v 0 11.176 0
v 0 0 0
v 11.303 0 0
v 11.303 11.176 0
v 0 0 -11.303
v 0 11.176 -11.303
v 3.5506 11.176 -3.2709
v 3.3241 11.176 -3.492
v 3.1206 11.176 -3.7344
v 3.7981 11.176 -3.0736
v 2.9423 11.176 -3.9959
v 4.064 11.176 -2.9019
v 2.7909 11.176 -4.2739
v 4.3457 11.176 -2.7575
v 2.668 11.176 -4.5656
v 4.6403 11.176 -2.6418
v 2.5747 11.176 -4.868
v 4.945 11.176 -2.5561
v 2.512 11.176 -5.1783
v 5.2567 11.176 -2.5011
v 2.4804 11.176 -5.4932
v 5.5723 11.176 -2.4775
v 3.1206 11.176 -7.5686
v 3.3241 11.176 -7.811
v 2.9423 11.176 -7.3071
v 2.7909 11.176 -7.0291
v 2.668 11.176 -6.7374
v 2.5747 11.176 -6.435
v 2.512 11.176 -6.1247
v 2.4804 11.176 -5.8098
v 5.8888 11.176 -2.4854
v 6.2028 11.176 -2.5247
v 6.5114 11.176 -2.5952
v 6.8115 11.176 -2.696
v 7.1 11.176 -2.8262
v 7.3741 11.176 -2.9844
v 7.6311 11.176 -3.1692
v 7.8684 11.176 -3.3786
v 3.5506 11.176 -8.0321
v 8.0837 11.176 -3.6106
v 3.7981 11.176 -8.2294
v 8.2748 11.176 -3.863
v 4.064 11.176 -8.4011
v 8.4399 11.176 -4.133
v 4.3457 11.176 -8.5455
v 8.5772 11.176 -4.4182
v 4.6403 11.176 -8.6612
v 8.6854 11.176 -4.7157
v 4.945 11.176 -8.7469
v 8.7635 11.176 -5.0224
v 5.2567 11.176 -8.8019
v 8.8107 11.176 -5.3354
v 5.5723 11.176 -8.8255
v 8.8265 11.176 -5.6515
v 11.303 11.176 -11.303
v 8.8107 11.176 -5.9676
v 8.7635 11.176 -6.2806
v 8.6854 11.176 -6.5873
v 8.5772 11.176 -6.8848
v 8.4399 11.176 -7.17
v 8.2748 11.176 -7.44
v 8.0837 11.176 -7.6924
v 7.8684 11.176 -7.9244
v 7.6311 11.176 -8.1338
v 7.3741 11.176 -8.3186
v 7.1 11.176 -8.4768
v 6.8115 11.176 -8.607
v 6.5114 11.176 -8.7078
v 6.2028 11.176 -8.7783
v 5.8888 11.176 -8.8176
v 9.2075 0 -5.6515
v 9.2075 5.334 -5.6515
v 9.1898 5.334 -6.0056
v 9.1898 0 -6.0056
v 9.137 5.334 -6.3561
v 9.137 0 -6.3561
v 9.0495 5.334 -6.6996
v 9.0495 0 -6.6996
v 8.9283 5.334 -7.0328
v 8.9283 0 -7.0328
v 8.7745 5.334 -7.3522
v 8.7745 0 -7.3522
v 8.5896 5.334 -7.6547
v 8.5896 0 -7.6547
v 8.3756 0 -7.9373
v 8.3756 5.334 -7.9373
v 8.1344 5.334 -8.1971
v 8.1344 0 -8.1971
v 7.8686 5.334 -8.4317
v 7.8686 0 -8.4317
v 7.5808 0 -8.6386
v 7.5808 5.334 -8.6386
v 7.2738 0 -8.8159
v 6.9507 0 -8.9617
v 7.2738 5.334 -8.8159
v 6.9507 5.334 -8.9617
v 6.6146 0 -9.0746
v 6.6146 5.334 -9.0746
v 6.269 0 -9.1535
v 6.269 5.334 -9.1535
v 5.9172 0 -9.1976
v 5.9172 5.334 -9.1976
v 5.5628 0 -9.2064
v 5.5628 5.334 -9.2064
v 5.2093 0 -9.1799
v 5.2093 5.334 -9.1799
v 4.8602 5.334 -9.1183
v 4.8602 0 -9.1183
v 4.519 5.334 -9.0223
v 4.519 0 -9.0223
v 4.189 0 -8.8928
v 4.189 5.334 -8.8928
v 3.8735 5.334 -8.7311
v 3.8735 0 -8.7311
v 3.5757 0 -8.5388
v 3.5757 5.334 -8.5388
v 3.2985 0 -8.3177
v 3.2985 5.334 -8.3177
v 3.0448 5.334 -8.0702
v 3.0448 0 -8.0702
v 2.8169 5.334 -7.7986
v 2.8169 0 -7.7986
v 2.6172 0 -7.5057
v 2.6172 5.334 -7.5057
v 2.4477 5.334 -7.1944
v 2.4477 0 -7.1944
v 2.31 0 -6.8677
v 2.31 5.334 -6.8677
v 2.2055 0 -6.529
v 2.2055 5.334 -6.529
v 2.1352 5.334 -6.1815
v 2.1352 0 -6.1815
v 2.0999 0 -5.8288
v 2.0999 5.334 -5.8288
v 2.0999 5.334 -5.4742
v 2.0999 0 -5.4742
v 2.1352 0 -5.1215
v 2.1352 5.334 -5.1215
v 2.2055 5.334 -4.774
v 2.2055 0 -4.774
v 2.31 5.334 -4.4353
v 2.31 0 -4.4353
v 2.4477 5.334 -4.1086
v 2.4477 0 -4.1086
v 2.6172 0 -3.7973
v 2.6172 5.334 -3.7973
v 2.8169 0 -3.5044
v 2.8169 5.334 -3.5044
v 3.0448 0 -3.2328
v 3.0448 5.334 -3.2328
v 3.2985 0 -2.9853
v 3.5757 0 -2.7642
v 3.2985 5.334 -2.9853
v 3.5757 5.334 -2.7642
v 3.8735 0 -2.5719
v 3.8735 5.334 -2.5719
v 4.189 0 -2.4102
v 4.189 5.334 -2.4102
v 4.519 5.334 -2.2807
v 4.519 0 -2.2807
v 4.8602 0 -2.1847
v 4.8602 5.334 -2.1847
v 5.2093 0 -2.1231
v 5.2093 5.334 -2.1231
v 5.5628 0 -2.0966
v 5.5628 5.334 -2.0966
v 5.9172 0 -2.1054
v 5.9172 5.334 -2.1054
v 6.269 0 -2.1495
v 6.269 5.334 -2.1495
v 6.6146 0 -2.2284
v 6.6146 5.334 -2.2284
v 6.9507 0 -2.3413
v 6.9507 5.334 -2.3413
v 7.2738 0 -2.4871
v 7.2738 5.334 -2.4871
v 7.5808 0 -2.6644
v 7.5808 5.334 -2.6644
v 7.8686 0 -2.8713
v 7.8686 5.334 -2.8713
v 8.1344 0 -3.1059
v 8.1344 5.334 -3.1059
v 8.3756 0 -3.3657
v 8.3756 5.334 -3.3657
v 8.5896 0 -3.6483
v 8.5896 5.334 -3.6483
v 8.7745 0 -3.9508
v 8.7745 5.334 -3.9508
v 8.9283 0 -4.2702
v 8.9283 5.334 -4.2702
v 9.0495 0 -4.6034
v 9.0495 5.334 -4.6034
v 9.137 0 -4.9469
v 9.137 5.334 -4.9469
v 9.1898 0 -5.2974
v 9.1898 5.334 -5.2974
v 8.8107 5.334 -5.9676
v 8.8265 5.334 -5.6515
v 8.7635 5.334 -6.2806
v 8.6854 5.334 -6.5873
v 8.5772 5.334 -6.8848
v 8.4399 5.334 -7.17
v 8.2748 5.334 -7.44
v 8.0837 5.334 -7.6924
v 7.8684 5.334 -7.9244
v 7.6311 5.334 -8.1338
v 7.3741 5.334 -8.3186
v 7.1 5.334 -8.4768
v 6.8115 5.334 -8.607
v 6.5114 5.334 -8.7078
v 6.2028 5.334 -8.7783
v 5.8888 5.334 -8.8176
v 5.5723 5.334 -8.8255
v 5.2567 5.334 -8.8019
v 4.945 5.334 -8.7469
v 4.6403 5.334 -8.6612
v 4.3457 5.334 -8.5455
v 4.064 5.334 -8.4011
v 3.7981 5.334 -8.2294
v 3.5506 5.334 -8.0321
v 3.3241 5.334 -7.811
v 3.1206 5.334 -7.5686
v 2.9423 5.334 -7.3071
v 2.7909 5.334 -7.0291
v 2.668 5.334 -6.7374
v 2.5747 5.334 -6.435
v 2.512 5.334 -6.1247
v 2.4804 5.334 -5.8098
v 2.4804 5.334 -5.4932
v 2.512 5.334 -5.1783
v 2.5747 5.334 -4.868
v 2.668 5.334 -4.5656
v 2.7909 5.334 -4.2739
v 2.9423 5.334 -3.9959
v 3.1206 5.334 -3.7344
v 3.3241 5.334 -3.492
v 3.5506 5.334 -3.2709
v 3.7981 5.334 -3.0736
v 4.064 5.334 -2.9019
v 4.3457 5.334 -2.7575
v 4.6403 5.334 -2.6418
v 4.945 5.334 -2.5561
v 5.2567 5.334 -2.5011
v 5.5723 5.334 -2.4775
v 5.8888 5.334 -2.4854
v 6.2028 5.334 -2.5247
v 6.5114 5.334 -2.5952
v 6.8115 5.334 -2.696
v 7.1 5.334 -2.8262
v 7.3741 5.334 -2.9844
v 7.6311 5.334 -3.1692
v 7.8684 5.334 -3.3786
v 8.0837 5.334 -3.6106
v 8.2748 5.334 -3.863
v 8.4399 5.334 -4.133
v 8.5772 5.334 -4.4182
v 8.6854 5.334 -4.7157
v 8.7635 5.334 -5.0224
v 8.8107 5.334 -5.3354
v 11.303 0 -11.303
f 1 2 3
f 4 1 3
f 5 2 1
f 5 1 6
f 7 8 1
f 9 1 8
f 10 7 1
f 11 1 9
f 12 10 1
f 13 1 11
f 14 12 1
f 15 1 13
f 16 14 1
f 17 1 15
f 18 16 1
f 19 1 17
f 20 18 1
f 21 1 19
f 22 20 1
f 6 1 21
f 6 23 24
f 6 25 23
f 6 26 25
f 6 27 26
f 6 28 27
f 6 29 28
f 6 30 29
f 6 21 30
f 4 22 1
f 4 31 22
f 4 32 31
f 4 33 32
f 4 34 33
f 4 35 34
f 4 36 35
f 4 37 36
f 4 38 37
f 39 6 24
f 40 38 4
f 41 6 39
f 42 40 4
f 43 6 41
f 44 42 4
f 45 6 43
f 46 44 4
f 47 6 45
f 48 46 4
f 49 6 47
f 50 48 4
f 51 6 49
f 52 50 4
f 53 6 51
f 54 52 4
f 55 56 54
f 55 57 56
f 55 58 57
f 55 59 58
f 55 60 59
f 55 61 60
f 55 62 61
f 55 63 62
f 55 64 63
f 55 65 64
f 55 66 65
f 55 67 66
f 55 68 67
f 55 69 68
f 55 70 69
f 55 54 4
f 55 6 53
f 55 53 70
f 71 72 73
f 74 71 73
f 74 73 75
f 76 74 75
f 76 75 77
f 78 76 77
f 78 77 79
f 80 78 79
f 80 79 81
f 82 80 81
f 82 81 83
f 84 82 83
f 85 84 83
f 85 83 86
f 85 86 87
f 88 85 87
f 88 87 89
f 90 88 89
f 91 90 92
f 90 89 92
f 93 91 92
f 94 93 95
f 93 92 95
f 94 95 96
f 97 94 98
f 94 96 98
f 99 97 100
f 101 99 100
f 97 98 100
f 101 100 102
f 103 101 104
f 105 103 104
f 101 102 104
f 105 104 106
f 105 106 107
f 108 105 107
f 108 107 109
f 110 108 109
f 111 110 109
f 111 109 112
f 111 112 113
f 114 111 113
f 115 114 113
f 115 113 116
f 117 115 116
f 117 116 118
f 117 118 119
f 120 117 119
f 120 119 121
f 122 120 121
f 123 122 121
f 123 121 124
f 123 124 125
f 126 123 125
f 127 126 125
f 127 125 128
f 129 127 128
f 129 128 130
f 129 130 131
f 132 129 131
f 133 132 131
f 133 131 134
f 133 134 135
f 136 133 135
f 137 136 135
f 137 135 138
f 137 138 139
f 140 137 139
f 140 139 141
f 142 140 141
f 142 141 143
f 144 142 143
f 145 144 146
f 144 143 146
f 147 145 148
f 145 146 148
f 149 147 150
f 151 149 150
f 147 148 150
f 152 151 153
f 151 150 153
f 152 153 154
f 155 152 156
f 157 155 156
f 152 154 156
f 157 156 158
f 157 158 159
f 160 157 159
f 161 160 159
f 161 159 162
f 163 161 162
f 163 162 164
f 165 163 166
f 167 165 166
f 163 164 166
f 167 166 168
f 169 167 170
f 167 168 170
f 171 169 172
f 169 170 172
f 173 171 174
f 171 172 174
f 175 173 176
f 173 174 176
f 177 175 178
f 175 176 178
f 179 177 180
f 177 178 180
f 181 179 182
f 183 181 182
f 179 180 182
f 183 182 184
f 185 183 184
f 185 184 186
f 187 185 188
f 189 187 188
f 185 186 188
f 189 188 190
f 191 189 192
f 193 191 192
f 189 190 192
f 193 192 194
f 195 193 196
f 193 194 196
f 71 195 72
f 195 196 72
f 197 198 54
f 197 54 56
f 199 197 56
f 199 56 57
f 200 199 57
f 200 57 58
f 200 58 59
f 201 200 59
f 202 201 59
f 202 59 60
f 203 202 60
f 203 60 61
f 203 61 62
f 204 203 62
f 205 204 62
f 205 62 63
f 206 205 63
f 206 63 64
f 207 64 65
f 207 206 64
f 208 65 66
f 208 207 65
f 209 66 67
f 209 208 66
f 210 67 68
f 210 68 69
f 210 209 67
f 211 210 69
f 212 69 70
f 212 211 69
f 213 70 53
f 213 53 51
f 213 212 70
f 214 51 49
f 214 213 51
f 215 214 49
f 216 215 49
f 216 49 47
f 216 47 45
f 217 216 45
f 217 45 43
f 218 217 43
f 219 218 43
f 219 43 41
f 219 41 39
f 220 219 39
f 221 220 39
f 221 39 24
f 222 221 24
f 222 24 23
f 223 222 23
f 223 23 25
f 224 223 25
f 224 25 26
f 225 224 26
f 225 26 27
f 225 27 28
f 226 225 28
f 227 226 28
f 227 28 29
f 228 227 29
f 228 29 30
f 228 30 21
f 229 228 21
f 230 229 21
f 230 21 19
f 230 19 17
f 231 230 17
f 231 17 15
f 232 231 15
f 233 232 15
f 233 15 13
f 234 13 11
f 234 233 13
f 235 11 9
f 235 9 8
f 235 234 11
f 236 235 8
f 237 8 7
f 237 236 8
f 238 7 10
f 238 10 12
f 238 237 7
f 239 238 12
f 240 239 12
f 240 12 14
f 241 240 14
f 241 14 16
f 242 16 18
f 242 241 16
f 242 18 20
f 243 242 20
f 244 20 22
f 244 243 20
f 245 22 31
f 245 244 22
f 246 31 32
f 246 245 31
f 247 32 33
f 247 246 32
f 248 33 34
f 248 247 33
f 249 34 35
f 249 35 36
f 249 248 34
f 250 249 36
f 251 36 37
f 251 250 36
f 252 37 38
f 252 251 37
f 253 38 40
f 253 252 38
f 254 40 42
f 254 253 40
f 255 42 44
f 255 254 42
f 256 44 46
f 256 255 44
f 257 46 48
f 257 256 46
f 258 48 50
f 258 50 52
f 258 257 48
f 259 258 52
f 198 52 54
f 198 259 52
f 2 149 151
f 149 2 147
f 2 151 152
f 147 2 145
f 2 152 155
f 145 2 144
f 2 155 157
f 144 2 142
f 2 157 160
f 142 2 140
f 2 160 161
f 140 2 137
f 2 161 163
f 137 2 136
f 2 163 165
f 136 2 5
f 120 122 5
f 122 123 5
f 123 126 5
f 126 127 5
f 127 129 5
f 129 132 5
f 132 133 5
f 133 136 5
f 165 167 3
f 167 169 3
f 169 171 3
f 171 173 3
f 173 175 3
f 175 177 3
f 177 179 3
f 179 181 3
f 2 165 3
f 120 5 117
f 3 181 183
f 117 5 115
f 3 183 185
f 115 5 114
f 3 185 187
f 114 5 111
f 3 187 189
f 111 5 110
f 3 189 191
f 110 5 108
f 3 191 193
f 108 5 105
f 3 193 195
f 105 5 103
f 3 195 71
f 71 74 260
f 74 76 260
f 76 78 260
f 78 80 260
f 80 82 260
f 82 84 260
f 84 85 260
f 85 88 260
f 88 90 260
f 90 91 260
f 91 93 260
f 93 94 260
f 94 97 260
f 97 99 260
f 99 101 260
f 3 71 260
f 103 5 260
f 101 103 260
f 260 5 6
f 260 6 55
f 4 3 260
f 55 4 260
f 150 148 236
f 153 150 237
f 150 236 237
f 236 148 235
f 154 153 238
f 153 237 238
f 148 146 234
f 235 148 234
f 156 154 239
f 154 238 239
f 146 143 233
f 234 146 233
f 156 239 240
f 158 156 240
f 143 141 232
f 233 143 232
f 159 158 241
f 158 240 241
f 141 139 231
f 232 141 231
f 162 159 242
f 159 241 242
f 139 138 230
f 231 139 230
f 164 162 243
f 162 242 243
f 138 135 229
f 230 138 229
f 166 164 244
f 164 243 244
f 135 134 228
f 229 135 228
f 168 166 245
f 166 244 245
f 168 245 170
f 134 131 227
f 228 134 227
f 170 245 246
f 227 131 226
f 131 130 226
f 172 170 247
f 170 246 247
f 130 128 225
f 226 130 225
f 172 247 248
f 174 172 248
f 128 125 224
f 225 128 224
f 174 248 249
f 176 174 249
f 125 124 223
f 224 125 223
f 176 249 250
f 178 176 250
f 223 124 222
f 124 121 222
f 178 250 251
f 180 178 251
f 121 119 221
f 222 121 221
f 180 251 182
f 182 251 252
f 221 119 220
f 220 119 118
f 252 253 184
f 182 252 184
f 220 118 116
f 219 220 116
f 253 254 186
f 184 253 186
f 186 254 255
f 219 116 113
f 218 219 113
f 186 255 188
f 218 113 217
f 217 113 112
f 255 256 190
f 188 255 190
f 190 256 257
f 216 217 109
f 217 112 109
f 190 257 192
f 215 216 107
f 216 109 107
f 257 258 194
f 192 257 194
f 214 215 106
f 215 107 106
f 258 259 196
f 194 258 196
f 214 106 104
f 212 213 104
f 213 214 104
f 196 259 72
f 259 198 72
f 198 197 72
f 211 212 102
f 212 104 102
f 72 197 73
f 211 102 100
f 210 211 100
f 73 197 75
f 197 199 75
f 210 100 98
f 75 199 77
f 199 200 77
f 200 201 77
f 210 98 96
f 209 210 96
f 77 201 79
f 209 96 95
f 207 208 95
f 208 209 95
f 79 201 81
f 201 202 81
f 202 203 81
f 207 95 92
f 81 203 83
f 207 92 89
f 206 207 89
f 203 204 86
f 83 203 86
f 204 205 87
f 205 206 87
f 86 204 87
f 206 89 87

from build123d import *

# Parameters (mm, degrees)
SKETCH1_W           = 11.303
SKETCH1_H           = 11.303
SKETCH1_R           = 3.175
BOSS_EXTRUDE1_DEPTH = 11.176
CUT_EXTRUDE1_REACH  = 19.018
CUT_EXTRUDE1_START  = -5.842
SKETCH2_R           = 3.556
SKETCH2_R_2         = 3.175


with BuildPart() as part:
    # Sketch1 → Boss-Extrude1 (new body)
    with BuildSketch(Plane(origin=(0, 0, 0), x_dir=(1, 0, 0), z_dir=(0, 1, 0))):
        with Locations((5.6515, 5.6515)):
            Rectangle(SKETCH1_W, SKETCH1_H)
        with Locations((5.6515, 5.6515)):
            Circle(SKETCH1_R, mode=Mode.SUBTRACT)
    extrude(amount=BOSS_EXTRUDE1_DEPTH)

    # Sketch2 → Cut-Extrude1 (cut, up to next)
    with BuildSketch(Plane(origin=(0, 11.176, 0), x_dir=(1, 0, 0), z_dir=(0, 1, 0)).offset(CUT_EXTRUDE1_START), mode=Mode.PRIVATE) as cut_extrude1_sk1:
        with Locations((5.6515, 5.6515)):
            Circle(SKETCH2_R)
        with Locations((5.6515, 5.6515)):
            Circle(SKETCH2_R_2, mode=Mode.SUBTRACT)
    cut_extrude1_tool1 = extrude(cut_extrude1_sk1.sketch, amount=-CUT_EXTRUDE1_REACH, mode=Mode.PRIVATE) & part.part
    add(cut_extrude1_tool1.solids().sort_by_distance((2.196079, 5.334, -5.6515))[0], mode=Mode.SUBTRACT)


solid = part.part
